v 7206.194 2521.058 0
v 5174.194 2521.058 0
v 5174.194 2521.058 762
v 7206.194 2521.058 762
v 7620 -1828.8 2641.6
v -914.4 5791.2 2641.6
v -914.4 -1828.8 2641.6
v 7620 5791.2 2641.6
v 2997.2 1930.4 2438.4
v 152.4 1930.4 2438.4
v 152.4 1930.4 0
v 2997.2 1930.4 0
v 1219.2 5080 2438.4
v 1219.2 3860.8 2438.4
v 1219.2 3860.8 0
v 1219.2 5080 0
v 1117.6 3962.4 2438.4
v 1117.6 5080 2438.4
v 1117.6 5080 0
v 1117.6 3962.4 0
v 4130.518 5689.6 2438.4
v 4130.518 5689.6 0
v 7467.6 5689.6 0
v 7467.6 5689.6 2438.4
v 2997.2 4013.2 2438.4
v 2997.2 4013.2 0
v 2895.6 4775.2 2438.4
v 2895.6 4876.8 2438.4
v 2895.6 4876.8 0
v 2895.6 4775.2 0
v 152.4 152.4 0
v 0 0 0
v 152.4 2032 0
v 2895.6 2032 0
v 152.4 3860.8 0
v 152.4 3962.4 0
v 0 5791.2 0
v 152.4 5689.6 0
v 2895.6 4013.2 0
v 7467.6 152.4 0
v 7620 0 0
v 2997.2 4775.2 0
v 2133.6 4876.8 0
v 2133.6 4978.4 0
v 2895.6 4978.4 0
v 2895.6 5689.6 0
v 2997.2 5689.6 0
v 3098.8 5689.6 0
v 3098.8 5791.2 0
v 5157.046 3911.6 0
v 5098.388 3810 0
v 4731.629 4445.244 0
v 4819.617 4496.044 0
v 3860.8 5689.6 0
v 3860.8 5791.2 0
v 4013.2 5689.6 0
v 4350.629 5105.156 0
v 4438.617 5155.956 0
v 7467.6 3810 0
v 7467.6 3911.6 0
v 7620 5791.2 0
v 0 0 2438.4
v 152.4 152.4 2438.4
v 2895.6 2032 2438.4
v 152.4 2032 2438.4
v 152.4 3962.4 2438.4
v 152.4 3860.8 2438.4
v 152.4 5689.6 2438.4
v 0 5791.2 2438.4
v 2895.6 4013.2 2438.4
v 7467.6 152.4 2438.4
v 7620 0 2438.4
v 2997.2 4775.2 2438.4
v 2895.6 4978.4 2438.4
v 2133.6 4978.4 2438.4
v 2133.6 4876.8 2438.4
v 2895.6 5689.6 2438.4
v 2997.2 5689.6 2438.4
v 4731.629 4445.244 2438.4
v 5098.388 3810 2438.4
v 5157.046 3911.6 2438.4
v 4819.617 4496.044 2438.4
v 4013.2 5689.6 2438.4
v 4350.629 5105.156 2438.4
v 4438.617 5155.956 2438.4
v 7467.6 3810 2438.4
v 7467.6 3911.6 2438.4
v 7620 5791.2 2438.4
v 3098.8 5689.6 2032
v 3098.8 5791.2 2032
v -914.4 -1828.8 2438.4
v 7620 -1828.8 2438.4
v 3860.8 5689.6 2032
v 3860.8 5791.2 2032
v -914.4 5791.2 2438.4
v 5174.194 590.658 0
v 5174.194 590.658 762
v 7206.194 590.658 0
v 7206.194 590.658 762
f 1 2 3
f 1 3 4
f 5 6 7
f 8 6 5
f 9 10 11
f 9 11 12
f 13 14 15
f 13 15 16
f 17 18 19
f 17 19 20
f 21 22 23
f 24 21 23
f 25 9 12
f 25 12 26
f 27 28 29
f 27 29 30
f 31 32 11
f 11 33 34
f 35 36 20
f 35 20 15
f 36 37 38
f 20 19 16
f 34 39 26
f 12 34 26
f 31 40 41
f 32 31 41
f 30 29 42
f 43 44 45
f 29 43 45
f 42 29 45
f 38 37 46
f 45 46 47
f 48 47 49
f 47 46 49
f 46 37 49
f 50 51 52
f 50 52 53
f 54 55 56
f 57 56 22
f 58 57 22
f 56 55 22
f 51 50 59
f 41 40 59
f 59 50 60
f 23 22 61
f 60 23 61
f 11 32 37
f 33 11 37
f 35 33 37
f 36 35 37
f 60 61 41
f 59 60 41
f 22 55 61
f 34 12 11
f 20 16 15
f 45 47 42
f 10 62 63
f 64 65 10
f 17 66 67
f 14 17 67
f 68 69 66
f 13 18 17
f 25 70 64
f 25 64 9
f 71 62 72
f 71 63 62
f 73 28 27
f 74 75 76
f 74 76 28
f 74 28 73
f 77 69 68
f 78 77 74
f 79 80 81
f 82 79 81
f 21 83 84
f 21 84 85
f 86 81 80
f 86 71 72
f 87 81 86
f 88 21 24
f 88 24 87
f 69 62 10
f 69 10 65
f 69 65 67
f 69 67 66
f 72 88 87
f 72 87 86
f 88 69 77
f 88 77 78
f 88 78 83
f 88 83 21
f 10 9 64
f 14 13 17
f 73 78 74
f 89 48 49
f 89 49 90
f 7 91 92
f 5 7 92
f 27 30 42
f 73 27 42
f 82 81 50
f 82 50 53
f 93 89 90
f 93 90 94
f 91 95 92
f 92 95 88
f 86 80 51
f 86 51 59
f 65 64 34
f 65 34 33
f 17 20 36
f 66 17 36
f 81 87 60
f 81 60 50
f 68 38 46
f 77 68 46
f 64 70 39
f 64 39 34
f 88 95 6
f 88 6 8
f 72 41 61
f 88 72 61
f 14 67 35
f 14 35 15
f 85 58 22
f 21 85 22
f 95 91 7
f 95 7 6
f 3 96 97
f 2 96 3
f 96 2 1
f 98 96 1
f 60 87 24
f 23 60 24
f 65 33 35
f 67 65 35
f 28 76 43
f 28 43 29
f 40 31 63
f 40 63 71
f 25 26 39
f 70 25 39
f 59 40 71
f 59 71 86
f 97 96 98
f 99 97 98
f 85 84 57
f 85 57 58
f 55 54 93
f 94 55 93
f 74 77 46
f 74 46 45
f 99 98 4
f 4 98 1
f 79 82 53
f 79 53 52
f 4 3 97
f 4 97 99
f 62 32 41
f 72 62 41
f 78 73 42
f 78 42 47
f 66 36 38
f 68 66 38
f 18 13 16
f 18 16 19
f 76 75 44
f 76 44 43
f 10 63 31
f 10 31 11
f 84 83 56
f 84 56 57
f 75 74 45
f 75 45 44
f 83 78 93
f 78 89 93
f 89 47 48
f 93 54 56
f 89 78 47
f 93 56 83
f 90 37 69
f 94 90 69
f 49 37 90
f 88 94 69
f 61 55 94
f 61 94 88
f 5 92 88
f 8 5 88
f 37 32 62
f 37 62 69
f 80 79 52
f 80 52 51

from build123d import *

# Parameters (mm, degrees)
F0_W     = 7620
F0_H     = 5791.2
F0_W_2   = 7315.2
F0_H_2   = 5537.2
F1_DEPTH = 2438.4
F2_W     = 762
F2_H     = 2032
F3_DEPTH = 101.6
F5_DEPTH = 2438.4
F6_W     = 2032
F6_H     = 1930.4
F7_DEPTH = 762
F8_W     = 8534.4
F8_H     = 7620
F9_DEPTH = 203.2


with BuildPart() as f1:
    # F0 (on Top) → F1 (new body)
    with BuildSketch(Plane.XY):
        with Locations((3810, 2895.6)):
            Rectangle(F0_W, F0_H)
        with Locations((3810, 2921)):
            Rectangle(F0_W_2, F0_H_2, mode=Mode.SUBTRACT)
    extrude(amount=F1_DEPTH)

    # F2 (on face) → F3 (cut, through all)
    with BuildSketch(Plane.XZ.offset(-5689.6)):
        with Locations((3479.8, 1016)):
            Rectangle(F2_W, F2_H)
    extrude(amount=-F3_DEPTH, mode=Mode.SUBTRACT)

    # F4 (on face) → F5 (join, through all)
    with BuildSketch(Plane.XY.offset(2438.4)):
        Polygon((2997.2, 4775.2), (2997.2, 5689.6), (2895.6, 5689.6), (2895.6, 4978.4), (2133.6, 4978.4), (2133.6, 4876.8), (2895.6, 4876.8), (2895.6, 4775.2), align=None)
        Polygon((2895.6, 2032), (152.4, 2032), (152.4, 1930.4), (2997.2, 1930.4), (2997.2, 4013.2), (2895.6, 4013.2), align=None)
        Polygon((152.4, 3962.4), (152.4, 3860.8), (1219.2, 3860.8), (1219.2, 5080), (1117.6, 5080), (1117.6, 3962.4), align=None)
        Polygon((4130.517575, 5689.6), (4013.2, 5689.6), (4350.629086, 5105.155679), (4438.617267, 5155.955679), align=None)
        Polygon((5098.387566, 3810), (7467.6, 3810), (7467.6, 3911.6), (5157.046353, 3911.6), (4819.617267, 4496.044321), (4731.629086, 4445.244321), align=None)
    extrude(amount=-F5_DEPTH)


with BuildPart() as f7:
    # F6 (on Top) → F7 (new body)
    with BuildSketch(Plane.XY):
        with Locations((6190.193924, 1555.858083)):
            Rectangle(F6_W, F6_H)
    extrude(amount=F7_DEPTH)


with BuildPart() as f9:
    # F8 (on face) → F9 (new body)
    with BuildSketch(Plane.XY.offset(2438.4)):
        with Locations((3352.8, 1981.2)):
            Rectangle(F8_W, F8_H)
    extrude(amount=F9_DEPTH)


solid = Compound([f1.part, f7.part, f9.part])
